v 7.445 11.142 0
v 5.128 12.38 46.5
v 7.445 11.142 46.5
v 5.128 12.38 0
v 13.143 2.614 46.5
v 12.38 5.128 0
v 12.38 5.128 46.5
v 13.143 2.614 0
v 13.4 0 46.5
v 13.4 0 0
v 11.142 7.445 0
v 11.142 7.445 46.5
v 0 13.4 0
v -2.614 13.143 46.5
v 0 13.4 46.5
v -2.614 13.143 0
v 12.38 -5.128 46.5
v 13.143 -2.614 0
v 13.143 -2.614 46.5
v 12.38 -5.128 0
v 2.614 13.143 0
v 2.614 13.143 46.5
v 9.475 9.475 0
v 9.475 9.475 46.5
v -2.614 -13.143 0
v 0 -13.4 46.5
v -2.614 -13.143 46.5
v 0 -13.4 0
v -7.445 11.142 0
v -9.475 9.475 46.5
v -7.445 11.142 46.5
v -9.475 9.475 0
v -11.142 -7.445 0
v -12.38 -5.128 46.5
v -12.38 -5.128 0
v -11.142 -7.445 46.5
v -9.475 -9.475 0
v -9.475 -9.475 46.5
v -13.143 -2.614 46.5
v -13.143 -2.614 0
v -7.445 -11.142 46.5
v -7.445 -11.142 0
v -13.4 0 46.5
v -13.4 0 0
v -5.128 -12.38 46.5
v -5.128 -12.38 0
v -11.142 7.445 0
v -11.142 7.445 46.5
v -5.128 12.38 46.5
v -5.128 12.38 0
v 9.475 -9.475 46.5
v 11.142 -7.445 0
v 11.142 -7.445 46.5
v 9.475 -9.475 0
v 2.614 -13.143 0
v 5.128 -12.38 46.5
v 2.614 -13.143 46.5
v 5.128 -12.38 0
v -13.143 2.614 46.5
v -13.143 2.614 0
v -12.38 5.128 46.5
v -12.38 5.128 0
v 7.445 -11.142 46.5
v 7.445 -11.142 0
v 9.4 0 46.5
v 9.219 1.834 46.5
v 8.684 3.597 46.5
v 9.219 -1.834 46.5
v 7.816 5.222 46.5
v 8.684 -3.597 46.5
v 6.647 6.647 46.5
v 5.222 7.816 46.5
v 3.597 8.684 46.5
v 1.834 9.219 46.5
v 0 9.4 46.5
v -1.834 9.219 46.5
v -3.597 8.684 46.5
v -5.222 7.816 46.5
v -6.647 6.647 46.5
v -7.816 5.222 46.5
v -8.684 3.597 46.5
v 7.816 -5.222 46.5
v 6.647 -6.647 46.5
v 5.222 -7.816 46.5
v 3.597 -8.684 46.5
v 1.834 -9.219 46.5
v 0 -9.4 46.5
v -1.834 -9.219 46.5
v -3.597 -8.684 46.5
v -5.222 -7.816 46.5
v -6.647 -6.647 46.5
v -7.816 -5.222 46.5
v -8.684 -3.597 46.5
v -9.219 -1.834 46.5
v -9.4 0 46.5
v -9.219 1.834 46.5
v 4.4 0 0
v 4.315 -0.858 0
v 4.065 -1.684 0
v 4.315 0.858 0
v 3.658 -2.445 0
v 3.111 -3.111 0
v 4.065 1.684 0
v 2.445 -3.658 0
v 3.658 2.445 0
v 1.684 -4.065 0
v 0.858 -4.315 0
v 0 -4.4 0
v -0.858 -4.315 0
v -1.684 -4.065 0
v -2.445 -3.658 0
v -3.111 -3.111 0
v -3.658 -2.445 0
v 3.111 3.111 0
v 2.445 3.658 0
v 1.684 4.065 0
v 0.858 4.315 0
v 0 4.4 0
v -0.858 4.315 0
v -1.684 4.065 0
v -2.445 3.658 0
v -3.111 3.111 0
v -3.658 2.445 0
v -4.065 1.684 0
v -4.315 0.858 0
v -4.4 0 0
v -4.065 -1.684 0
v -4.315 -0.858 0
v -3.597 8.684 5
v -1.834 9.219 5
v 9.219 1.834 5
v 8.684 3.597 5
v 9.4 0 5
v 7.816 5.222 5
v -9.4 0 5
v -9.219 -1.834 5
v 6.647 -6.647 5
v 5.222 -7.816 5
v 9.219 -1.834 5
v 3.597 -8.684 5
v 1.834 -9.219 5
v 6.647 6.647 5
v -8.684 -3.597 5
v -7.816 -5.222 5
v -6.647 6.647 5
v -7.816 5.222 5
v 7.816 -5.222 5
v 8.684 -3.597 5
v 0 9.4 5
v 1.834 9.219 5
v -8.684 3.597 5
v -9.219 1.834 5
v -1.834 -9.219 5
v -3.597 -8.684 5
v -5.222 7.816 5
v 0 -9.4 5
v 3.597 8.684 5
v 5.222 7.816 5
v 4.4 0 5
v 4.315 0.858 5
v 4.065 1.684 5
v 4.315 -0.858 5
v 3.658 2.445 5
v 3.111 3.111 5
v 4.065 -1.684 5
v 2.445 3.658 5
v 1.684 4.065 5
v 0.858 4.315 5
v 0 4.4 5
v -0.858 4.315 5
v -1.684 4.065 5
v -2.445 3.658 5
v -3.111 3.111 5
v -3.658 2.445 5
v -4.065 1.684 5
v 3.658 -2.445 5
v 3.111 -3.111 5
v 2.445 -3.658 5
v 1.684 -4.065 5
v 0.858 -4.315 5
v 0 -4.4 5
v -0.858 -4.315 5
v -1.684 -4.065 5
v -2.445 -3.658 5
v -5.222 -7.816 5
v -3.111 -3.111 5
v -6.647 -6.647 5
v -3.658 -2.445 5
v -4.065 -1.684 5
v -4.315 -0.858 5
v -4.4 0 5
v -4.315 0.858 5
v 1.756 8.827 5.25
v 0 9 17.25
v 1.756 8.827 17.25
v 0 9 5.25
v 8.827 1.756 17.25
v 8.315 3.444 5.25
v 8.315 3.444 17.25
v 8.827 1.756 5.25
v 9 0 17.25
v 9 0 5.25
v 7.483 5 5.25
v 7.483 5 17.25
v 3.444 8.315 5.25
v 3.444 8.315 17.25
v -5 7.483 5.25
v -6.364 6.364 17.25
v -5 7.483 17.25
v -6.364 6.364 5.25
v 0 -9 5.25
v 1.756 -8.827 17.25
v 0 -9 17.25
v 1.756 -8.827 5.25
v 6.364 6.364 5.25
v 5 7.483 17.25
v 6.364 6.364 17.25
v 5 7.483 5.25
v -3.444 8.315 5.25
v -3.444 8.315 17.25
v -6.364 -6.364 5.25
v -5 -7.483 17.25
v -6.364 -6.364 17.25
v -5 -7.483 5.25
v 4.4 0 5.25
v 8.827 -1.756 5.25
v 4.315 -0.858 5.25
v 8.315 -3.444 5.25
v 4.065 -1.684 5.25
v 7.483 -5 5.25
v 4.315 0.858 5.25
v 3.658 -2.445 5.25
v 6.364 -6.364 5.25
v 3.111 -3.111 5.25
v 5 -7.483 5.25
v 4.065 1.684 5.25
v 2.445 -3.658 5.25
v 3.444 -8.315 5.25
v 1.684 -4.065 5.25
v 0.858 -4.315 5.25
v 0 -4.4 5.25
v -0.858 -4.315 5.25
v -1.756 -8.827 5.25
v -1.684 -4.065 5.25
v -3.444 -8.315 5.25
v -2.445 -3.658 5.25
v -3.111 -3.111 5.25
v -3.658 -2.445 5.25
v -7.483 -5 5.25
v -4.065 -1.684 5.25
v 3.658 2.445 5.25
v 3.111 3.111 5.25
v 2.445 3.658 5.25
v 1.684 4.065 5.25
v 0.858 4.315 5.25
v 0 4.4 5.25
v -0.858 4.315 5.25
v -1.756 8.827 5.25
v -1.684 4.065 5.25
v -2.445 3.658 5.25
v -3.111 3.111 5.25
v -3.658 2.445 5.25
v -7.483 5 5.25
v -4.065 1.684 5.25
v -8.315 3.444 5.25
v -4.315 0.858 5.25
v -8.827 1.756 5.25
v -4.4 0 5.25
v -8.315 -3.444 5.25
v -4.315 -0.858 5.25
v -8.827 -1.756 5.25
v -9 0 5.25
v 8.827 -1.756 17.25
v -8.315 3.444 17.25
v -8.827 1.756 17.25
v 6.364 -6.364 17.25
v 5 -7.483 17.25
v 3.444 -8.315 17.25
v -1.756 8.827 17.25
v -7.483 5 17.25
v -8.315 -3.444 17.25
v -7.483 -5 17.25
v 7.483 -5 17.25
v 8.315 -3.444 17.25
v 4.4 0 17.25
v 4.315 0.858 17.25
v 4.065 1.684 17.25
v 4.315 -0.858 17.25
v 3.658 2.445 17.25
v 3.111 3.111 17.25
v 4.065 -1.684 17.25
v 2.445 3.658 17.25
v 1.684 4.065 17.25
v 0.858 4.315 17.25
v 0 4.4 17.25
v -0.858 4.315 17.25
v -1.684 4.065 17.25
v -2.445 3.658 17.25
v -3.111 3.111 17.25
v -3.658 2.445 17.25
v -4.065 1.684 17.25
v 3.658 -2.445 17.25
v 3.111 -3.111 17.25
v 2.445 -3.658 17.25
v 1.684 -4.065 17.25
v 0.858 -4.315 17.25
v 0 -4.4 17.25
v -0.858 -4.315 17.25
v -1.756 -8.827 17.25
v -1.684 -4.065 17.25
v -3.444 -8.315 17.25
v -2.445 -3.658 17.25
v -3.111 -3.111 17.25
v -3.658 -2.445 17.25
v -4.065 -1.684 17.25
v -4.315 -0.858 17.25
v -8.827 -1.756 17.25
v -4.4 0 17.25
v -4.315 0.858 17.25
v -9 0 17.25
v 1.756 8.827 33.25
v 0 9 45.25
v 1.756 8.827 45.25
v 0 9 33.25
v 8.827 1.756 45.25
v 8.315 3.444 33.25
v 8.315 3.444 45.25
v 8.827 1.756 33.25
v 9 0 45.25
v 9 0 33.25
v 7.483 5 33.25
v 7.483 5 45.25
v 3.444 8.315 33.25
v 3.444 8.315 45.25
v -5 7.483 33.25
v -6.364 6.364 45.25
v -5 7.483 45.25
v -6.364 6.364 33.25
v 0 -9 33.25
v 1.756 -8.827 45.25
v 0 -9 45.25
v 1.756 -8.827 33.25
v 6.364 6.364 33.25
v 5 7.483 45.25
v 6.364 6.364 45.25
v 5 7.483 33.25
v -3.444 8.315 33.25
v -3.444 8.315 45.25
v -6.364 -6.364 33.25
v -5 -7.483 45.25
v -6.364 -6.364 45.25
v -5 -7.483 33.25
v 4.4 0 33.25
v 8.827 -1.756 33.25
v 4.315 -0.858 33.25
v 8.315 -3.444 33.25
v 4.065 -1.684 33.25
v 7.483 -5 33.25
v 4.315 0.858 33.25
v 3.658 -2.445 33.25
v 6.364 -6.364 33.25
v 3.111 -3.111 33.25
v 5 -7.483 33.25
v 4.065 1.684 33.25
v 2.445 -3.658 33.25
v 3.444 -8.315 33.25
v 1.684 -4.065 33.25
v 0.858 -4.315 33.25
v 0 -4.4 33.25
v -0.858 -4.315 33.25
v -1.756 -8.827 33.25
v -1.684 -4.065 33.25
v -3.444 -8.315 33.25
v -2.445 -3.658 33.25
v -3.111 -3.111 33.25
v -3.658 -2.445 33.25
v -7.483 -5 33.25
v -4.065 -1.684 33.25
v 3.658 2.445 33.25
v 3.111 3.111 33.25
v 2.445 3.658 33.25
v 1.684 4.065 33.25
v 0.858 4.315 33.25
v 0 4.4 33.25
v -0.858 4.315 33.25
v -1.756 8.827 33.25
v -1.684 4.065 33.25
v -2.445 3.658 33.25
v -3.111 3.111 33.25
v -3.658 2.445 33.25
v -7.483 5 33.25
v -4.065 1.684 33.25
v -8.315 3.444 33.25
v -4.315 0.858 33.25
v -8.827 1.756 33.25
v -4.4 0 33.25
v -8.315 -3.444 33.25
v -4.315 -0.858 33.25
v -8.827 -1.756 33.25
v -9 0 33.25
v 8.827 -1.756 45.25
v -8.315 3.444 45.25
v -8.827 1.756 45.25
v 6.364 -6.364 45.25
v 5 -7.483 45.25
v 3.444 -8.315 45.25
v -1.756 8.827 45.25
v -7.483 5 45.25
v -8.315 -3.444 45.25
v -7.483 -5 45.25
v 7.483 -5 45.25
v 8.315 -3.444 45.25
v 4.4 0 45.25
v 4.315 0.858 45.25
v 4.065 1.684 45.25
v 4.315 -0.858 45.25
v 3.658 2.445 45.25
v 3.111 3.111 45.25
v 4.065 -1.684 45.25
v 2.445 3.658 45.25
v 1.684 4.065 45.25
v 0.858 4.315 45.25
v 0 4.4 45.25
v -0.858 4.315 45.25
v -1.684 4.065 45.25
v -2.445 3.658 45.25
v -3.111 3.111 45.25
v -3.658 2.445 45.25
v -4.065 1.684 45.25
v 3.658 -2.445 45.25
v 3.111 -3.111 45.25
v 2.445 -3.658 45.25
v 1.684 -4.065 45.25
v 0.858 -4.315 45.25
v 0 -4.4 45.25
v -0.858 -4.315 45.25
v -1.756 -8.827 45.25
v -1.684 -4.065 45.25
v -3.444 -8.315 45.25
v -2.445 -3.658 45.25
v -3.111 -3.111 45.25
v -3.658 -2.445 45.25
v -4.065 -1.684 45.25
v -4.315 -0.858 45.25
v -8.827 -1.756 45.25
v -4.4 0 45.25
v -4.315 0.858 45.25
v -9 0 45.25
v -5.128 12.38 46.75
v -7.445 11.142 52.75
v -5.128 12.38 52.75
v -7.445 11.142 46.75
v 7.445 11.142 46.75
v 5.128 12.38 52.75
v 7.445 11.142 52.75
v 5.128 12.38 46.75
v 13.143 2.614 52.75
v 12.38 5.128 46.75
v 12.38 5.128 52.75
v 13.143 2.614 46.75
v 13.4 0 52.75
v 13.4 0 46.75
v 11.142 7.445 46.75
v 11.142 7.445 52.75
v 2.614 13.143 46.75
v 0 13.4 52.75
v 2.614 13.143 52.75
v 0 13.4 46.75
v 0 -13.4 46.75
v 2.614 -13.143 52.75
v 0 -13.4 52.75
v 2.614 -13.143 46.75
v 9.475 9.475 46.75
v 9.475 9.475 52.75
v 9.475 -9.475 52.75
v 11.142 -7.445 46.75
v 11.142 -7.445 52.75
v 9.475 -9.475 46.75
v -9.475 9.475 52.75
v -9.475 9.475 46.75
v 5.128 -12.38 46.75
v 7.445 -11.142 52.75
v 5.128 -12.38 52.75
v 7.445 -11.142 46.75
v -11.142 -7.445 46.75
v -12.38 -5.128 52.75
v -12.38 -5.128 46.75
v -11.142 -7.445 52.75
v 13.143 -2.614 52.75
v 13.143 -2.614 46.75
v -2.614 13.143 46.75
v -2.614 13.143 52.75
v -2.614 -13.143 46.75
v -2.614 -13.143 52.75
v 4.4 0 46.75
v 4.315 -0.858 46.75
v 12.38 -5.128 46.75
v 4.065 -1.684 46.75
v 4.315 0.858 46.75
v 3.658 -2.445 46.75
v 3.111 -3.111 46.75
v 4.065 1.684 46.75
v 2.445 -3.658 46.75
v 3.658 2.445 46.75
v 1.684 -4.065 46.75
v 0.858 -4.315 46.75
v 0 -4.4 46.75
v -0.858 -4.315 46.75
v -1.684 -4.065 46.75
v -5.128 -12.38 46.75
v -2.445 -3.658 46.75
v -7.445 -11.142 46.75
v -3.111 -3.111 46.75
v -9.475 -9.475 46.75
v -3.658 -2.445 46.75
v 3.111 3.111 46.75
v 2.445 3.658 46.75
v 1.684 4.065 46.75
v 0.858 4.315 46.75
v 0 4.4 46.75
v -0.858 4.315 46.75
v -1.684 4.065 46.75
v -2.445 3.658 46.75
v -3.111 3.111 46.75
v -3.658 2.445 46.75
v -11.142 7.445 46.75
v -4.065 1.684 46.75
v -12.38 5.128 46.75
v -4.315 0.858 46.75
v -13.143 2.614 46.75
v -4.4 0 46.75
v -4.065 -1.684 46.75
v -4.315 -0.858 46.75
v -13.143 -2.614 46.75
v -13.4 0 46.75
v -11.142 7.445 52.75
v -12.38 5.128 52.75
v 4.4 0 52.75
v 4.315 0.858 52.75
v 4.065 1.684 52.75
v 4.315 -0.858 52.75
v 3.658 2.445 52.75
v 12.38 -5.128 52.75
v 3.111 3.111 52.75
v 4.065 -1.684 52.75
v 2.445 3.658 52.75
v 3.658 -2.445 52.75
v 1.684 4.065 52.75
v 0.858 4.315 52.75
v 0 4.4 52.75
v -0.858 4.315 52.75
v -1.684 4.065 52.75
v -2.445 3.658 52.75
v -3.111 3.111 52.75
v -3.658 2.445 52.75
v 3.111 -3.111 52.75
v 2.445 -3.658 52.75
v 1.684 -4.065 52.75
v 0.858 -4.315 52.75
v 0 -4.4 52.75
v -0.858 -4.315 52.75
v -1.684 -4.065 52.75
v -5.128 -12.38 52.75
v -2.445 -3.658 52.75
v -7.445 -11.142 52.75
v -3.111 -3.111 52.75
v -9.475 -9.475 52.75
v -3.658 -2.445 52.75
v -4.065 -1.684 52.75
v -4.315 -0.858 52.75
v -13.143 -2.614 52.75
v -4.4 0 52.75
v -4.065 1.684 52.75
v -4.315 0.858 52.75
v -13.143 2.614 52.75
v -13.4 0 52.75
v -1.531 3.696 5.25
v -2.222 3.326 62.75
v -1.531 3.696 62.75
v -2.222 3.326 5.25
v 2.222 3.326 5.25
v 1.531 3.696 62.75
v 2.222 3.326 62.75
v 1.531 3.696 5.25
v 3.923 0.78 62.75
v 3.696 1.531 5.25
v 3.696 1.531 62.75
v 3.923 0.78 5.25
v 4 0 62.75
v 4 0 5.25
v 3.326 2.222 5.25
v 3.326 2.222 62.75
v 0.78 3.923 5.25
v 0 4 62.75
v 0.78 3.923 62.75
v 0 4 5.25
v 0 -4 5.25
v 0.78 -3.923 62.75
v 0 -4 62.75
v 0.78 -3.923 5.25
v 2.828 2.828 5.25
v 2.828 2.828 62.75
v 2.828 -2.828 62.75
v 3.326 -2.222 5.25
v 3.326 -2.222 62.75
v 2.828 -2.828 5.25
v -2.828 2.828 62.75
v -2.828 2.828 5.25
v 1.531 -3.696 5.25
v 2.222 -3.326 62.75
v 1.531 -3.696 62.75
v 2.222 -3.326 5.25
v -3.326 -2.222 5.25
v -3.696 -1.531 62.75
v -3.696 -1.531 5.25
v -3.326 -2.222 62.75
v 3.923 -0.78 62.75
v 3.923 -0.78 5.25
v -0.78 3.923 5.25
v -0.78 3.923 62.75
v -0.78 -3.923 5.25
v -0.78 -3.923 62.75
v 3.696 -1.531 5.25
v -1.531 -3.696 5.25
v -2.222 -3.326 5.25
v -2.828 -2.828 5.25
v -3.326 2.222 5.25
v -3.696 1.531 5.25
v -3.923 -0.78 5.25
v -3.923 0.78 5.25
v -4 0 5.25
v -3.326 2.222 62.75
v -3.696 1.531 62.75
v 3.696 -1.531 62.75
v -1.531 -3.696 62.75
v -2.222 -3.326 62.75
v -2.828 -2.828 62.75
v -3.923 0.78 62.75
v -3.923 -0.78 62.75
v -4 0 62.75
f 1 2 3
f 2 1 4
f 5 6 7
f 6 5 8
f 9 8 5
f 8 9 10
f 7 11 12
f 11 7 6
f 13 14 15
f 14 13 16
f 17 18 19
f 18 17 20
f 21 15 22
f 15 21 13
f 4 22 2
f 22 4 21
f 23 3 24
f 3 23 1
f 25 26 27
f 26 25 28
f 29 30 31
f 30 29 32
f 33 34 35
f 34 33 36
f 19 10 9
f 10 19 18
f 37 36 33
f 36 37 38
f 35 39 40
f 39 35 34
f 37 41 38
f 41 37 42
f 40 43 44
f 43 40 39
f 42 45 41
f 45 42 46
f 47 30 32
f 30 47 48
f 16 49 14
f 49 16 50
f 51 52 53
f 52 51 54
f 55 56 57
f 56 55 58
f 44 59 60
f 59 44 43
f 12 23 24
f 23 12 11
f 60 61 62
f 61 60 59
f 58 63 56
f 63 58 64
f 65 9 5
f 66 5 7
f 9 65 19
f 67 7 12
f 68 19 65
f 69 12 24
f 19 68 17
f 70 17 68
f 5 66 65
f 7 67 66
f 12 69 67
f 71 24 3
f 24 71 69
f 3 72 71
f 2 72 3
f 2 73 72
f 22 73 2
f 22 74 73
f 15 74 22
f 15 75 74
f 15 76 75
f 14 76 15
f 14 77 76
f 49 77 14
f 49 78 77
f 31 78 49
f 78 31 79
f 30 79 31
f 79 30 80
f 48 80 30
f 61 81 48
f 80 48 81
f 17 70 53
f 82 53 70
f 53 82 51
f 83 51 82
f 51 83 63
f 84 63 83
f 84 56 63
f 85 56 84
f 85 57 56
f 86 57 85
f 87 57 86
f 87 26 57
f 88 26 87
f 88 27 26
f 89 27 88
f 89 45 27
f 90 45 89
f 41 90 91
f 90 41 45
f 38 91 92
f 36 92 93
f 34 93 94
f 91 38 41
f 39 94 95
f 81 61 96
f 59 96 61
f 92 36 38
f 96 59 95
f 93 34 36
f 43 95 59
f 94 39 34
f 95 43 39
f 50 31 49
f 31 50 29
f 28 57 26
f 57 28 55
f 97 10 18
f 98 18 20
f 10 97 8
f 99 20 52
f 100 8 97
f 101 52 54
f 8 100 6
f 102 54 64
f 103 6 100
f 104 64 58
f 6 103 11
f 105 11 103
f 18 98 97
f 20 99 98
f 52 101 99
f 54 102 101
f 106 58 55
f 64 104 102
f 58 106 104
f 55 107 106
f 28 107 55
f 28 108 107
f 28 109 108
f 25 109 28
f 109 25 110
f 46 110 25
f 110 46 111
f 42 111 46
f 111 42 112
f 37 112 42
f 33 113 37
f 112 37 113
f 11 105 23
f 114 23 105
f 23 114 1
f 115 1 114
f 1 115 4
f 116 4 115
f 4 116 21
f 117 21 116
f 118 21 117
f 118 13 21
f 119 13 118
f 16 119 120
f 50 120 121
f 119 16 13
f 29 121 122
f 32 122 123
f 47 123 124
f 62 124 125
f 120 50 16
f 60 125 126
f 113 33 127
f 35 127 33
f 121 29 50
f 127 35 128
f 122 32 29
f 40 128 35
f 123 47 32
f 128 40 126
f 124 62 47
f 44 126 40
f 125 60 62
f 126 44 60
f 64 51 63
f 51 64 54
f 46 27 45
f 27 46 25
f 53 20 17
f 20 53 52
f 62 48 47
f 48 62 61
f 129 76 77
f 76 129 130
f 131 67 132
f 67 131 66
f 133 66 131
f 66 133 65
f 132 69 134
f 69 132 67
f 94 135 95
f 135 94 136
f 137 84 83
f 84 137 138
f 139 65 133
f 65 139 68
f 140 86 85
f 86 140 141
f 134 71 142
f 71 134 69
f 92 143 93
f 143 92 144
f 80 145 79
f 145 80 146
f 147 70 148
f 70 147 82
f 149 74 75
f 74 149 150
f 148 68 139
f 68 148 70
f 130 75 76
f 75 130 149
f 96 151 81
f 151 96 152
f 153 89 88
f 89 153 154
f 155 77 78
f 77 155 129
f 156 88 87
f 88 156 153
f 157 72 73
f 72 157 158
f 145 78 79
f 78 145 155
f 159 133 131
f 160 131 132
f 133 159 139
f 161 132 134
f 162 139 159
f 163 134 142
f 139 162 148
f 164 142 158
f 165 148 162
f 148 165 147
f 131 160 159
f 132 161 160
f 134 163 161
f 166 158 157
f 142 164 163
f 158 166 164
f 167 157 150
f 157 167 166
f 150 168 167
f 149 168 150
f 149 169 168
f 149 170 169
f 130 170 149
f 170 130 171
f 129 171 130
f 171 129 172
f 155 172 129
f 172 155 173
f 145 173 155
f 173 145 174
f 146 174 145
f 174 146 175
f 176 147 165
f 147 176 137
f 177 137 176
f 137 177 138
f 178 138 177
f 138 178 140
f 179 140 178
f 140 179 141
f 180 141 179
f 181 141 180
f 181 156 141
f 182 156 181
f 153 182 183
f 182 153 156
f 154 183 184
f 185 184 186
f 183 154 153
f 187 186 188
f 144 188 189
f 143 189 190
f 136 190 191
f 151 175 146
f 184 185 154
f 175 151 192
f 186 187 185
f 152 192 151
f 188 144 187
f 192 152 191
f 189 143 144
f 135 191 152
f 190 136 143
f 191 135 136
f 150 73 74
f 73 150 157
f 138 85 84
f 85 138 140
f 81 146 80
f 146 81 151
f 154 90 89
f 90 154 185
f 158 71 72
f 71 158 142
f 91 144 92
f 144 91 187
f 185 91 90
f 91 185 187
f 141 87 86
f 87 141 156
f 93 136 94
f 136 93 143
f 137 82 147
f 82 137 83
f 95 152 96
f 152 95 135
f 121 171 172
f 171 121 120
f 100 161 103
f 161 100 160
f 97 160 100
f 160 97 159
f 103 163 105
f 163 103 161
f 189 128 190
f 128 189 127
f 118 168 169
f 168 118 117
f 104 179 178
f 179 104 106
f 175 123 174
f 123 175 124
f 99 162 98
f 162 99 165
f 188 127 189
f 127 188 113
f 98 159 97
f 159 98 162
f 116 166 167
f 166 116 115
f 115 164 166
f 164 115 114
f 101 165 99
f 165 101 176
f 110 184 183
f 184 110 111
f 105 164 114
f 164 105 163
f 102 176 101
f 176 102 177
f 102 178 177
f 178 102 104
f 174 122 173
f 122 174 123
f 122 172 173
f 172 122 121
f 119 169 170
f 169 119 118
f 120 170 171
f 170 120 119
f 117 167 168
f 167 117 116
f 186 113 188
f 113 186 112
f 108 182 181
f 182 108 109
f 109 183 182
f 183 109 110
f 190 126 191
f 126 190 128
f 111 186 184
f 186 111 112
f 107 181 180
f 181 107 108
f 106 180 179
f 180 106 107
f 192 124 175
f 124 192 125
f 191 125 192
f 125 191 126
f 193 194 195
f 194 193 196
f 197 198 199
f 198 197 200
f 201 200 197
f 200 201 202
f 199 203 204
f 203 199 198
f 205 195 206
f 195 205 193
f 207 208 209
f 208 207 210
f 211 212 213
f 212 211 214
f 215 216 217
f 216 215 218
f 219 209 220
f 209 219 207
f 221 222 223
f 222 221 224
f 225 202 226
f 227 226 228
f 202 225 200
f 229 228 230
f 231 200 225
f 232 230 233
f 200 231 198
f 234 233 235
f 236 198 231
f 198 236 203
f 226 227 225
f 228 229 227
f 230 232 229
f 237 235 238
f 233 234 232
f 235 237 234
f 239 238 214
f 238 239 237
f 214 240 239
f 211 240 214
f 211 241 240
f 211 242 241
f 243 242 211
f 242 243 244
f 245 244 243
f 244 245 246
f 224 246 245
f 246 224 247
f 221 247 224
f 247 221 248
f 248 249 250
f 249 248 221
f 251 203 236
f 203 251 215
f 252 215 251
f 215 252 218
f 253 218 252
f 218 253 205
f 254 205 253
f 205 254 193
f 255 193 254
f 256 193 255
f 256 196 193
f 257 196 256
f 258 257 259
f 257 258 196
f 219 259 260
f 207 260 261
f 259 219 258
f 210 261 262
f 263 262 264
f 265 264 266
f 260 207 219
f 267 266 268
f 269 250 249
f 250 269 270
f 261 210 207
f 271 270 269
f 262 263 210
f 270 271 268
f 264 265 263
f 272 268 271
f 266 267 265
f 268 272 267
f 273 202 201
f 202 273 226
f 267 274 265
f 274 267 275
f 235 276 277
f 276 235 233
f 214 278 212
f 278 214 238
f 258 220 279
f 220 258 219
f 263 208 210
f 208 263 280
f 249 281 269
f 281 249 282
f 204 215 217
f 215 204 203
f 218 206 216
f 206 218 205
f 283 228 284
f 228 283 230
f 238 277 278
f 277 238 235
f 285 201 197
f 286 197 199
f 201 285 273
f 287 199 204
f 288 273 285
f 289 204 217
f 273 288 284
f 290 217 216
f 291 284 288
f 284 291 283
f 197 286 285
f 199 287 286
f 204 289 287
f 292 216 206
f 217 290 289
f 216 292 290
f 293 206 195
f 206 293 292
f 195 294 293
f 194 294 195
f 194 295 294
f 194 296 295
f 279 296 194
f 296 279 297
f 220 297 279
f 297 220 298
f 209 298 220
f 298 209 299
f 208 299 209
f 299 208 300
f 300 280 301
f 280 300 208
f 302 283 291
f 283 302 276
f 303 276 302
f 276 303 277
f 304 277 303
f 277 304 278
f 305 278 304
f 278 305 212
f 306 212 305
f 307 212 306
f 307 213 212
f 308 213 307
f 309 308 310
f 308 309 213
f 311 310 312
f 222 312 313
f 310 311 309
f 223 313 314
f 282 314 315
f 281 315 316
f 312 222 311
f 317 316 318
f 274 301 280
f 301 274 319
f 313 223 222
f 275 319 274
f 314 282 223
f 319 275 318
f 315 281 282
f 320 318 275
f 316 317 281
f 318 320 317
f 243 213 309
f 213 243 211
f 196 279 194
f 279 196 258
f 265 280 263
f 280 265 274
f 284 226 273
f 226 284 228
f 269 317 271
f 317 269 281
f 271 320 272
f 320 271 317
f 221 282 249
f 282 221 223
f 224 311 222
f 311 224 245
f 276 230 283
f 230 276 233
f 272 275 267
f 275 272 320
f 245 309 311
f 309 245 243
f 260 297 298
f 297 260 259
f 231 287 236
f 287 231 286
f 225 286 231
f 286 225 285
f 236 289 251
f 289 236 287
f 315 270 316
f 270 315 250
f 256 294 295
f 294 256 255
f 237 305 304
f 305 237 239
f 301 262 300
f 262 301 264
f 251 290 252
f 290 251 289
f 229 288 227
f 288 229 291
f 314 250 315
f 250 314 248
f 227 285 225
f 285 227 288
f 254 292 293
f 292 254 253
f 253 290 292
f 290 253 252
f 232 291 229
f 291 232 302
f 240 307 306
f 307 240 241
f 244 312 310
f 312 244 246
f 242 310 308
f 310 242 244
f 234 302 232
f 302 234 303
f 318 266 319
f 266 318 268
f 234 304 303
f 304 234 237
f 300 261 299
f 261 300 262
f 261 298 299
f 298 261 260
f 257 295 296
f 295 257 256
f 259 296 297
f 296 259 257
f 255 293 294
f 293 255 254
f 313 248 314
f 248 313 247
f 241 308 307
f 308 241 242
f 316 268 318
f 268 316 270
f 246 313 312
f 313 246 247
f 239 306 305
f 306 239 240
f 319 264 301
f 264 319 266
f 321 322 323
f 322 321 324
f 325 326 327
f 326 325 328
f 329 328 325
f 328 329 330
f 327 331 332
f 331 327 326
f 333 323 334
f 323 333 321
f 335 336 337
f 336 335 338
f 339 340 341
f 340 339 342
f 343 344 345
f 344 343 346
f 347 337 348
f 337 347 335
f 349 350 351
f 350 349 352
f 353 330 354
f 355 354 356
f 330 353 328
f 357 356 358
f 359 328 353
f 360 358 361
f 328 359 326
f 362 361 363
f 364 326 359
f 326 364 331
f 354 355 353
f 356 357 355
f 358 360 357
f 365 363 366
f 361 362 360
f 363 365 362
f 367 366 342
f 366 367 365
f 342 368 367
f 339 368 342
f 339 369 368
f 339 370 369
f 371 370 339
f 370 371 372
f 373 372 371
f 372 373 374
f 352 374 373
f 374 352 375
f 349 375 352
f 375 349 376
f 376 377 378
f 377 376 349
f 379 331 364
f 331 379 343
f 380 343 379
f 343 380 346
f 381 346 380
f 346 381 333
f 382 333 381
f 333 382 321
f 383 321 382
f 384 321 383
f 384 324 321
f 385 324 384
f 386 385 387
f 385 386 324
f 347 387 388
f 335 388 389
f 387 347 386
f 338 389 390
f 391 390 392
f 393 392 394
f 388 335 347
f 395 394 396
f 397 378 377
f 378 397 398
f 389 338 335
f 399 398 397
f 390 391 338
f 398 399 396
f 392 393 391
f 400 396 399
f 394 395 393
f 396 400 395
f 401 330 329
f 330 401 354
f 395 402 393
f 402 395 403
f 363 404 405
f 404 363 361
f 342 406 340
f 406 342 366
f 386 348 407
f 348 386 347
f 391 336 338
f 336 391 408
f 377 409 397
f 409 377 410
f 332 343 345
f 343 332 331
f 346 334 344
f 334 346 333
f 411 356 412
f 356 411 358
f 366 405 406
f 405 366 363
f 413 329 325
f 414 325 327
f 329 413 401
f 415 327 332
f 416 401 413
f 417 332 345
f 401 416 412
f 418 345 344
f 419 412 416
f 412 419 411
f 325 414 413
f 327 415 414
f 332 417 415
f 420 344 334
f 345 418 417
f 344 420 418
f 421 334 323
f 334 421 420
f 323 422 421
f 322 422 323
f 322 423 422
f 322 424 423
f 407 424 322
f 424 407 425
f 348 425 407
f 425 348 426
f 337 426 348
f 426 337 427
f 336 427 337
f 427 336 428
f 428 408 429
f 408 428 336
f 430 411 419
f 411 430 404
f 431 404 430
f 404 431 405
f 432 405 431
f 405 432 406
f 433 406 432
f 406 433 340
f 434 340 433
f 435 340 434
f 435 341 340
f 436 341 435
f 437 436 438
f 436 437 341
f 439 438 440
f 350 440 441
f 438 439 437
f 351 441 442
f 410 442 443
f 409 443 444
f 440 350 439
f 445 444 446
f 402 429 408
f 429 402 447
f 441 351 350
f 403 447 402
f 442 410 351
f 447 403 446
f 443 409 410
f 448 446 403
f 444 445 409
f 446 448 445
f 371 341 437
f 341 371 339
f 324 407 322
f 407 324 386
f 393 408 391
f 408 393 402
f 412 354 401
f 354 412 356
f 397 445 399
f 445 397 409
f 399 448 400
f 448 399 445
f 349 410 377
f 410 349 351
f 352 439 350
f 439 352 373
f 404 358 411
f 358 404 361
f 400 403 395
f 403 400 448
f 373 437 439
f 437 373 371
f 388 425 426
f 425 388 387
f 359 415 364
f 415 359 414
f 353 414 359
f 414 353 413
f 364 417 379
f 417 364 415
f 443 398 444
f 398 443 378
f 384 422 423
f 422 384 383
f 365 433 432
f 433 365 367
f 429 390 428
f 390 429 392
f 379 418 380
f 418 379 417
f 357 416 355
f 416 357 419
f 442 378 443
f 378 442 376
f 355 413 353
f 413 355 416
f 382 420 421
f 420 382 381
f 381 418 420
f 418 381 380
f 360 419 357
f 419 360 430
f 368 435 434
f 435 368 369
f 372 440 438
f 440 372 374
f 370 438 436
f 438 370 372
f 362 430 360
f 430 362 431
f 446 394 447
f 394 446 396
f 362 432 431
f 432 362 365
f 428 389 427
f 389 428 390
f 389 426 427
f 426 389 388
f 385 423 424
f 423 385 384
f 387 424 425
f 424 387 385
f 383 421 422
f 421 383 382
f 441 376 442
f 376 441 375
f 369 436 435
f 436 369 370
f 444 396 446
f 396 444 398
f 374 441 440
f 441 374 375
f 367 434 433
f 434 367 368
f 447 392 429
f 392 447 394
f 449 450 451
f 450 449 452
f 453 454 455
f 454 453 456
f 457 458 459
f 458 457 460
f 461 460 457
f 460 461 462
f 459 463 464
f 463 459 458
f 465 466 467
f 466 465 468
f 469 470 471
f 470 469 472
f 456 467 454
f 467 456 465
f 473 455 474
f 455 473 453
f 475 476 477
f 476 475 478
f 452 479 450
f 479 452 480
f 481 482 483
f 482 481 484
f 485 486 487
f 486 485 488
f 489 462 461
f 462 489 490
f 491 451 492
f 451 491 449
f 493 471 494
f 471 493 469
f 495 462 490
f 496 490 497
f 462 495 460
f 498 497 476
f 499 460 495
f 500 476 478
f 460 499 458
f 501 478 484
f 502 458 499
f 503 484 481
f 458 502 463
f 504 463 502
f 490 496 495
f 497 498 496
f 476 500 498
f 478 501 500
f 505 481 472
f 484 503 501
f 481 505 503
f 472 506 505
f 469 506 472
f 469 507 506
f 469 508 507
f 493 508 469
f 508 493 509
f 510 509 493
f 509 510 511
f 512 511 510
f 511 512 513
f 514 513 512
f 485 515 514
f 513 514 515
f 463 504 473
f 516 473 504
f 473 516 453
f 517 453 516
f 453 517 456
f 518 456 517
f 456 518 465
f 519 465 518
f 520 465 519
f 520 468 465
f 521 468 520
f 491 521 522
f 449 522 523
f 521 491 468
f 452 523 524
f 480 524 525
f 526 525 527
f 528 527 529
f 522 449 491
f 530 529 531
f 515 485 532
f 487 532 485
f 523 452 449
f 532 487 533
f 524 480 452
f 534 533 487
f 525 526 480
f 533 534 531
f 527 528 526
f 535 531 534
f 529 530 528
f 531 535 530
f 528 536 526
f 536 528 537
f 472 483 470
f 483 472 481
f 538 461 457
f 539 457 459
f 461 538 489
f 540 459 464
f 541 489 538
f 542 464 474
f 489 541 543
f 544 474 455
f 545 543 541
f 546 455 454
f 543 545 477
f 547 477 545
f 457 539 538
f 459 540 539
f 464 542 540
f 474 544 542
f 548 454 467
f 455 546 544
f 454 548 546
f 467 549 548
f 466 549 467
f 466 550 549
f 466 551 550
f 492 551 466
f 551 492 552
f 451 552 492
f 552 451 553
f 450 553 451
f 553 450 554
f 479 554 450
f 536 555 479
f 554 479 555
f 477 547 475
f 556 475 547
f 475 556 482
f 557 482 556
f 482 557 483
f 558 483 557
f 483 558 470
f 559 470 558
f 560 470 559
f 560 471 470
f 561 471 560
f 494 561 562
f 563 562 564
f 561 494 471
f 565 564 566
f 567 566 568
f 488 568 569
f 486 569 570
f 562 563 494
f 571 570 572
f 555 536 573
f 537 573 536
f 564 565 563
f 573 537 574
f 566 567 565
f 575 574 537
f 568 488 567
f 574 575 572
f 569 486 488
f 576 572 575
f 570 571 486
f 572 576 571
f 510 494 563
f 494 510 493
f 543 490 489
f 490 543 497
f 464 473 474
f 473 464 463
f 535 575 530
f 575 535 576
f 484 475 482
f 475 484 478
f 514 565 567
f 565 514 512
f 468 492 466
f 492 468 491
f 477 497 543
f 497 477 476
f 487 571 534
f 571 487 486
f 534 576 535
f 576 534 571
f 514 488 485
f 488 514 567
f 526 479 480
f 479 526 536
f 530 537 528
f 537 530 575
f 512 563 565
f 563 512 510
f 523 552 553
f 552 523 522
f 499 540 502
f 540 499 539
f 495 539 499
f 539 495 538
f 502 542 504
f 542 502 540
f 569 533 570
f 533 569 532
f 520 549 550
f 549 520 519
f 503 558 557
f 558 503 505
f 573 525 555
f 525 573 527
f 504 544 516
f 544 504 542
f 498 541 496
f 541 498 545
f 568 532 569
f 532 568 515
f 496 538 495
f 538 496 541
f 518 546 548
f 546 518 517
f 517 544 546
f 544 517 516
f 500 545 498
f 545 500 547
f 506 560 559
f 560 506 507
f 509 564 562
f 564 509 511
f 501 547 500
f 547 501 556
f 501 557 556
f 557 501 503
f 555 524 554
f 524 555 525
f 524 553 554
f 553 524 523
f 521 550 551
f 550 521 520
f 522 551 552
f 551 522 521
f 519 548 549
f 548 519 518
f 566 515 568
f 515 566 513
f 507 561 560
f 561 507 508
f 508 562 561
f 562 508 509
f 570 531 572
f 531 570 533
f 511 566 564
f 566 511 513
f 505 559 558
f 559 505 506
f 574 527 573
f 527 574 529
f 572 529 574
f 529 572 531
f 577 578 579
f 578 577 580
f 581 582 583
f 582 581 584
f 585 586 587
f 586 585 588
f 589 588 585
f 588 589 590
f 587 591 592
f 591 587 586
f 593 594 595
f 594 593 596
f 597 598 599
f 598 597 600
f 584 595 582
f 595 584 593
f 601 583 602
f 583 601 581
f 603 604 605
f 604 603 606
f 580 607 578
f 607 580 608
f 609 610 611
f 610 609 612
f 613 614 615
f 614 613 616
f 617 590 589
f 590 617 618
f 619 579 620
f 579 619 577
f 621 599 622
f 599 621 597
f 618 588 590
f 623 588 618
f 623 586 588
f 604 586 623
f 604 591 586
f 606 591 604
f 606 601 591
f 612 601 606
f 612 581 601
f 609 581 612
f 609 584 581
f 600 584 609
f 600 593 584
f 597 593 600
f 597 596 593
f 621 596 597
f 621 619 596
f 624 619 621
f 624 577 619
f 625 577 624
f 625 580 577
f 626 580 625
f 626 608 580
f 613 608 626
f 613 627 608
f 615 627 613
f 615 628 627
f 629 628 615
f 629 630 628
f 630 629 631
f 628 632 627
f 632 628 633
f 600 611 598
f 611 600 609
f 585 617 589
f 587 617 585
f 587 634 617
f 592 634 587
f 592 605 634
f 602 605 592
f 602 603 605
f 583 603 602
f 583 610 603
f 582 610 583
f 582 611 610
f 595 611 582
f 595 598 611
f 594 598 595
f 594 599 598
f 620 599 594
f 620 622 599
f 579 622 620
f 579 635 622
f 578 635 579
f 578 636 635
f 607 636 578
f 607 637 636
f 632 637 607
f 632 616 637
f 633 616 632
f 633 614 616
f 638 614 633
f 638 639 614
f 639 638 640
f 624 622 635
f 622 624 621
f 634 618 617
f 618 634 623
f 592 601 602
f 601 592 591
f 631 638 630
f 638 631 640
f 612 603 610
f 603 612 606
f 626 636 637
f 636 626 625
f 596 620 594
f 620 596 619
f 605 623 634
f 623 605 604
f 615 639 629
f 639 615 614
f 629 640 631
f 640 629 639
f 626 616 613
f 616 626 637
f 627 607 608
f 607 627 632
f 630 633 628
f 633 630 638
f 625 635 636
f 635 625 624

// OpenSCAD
$fn = 32;

// ------------------------------------------------------------------------
// Shaft station: cup d26.8 x 46.5 mm, shaft d8
// Every part is its own module, assembly() places every instance.
// ------------------------------------------------------------------------

// --- part 1 ---
module housing_cup() {
  difference() {
    cylinder(h = 46.5, d = 26.8);
    translate([0, 0, 5]) cylinder(h = 42.5, d = 18.8);
    translate([0, 0, -1]) cylinder(h = 7, d = 8.8);
  }
}

// --- part 2 ---
module bearing_lower() {
  difference() {
      translate([0, 0, 0]) cylinder(h = 12, d = 18);
      translate([0, 0, -1]) cylinder(h = 14, d = 8.8);
    }
}

// --- part 3 ---
module bearing_upper() {
  difference() {
      translate([0, 0, 0]) cylinder(h = 12, d = 18);
      translate([0, 0, -1]) cylinder(h = 14, d = 8.8);
    }
}

// --- part 4 ---
module station_shaft() {
  translate([0, 0, -28.75]) cylinder(h = 57.5, d = 8);
}

// --- part 5 ---
module station_cover() {
  difference() {
    cylinder(h = 6, d = 26.8);
    translate([0, 0, -1]) cylinder(h = 8, d = 8.8);
  }
}

// --- assembly ---
module assembly() {
  color([0.80, 0.24, 0.20]) translate([0, 0, 0]) rotate([0, 0, 0]) housing_cup();
  color([0.20, 0.45, 0.75]) translate([0, 0, 5.25]) rotate([0, 0, 0]) bearing_lower();
  color([0.25, 0.62, 0.32]) translate([0, 0, 33.25]) rotate([0, 0, 0]) bearing_upper();
  color([0.92, 0.70, 0.18]) translate([0, 0, 34]) rotate([0, 0, 0]) station_shaft();
  color([0.58, 0.35, 0.70]) translate([0, 0, 46.75]) rotate([0, 0, 0]) station_cover();
}

assembly();
